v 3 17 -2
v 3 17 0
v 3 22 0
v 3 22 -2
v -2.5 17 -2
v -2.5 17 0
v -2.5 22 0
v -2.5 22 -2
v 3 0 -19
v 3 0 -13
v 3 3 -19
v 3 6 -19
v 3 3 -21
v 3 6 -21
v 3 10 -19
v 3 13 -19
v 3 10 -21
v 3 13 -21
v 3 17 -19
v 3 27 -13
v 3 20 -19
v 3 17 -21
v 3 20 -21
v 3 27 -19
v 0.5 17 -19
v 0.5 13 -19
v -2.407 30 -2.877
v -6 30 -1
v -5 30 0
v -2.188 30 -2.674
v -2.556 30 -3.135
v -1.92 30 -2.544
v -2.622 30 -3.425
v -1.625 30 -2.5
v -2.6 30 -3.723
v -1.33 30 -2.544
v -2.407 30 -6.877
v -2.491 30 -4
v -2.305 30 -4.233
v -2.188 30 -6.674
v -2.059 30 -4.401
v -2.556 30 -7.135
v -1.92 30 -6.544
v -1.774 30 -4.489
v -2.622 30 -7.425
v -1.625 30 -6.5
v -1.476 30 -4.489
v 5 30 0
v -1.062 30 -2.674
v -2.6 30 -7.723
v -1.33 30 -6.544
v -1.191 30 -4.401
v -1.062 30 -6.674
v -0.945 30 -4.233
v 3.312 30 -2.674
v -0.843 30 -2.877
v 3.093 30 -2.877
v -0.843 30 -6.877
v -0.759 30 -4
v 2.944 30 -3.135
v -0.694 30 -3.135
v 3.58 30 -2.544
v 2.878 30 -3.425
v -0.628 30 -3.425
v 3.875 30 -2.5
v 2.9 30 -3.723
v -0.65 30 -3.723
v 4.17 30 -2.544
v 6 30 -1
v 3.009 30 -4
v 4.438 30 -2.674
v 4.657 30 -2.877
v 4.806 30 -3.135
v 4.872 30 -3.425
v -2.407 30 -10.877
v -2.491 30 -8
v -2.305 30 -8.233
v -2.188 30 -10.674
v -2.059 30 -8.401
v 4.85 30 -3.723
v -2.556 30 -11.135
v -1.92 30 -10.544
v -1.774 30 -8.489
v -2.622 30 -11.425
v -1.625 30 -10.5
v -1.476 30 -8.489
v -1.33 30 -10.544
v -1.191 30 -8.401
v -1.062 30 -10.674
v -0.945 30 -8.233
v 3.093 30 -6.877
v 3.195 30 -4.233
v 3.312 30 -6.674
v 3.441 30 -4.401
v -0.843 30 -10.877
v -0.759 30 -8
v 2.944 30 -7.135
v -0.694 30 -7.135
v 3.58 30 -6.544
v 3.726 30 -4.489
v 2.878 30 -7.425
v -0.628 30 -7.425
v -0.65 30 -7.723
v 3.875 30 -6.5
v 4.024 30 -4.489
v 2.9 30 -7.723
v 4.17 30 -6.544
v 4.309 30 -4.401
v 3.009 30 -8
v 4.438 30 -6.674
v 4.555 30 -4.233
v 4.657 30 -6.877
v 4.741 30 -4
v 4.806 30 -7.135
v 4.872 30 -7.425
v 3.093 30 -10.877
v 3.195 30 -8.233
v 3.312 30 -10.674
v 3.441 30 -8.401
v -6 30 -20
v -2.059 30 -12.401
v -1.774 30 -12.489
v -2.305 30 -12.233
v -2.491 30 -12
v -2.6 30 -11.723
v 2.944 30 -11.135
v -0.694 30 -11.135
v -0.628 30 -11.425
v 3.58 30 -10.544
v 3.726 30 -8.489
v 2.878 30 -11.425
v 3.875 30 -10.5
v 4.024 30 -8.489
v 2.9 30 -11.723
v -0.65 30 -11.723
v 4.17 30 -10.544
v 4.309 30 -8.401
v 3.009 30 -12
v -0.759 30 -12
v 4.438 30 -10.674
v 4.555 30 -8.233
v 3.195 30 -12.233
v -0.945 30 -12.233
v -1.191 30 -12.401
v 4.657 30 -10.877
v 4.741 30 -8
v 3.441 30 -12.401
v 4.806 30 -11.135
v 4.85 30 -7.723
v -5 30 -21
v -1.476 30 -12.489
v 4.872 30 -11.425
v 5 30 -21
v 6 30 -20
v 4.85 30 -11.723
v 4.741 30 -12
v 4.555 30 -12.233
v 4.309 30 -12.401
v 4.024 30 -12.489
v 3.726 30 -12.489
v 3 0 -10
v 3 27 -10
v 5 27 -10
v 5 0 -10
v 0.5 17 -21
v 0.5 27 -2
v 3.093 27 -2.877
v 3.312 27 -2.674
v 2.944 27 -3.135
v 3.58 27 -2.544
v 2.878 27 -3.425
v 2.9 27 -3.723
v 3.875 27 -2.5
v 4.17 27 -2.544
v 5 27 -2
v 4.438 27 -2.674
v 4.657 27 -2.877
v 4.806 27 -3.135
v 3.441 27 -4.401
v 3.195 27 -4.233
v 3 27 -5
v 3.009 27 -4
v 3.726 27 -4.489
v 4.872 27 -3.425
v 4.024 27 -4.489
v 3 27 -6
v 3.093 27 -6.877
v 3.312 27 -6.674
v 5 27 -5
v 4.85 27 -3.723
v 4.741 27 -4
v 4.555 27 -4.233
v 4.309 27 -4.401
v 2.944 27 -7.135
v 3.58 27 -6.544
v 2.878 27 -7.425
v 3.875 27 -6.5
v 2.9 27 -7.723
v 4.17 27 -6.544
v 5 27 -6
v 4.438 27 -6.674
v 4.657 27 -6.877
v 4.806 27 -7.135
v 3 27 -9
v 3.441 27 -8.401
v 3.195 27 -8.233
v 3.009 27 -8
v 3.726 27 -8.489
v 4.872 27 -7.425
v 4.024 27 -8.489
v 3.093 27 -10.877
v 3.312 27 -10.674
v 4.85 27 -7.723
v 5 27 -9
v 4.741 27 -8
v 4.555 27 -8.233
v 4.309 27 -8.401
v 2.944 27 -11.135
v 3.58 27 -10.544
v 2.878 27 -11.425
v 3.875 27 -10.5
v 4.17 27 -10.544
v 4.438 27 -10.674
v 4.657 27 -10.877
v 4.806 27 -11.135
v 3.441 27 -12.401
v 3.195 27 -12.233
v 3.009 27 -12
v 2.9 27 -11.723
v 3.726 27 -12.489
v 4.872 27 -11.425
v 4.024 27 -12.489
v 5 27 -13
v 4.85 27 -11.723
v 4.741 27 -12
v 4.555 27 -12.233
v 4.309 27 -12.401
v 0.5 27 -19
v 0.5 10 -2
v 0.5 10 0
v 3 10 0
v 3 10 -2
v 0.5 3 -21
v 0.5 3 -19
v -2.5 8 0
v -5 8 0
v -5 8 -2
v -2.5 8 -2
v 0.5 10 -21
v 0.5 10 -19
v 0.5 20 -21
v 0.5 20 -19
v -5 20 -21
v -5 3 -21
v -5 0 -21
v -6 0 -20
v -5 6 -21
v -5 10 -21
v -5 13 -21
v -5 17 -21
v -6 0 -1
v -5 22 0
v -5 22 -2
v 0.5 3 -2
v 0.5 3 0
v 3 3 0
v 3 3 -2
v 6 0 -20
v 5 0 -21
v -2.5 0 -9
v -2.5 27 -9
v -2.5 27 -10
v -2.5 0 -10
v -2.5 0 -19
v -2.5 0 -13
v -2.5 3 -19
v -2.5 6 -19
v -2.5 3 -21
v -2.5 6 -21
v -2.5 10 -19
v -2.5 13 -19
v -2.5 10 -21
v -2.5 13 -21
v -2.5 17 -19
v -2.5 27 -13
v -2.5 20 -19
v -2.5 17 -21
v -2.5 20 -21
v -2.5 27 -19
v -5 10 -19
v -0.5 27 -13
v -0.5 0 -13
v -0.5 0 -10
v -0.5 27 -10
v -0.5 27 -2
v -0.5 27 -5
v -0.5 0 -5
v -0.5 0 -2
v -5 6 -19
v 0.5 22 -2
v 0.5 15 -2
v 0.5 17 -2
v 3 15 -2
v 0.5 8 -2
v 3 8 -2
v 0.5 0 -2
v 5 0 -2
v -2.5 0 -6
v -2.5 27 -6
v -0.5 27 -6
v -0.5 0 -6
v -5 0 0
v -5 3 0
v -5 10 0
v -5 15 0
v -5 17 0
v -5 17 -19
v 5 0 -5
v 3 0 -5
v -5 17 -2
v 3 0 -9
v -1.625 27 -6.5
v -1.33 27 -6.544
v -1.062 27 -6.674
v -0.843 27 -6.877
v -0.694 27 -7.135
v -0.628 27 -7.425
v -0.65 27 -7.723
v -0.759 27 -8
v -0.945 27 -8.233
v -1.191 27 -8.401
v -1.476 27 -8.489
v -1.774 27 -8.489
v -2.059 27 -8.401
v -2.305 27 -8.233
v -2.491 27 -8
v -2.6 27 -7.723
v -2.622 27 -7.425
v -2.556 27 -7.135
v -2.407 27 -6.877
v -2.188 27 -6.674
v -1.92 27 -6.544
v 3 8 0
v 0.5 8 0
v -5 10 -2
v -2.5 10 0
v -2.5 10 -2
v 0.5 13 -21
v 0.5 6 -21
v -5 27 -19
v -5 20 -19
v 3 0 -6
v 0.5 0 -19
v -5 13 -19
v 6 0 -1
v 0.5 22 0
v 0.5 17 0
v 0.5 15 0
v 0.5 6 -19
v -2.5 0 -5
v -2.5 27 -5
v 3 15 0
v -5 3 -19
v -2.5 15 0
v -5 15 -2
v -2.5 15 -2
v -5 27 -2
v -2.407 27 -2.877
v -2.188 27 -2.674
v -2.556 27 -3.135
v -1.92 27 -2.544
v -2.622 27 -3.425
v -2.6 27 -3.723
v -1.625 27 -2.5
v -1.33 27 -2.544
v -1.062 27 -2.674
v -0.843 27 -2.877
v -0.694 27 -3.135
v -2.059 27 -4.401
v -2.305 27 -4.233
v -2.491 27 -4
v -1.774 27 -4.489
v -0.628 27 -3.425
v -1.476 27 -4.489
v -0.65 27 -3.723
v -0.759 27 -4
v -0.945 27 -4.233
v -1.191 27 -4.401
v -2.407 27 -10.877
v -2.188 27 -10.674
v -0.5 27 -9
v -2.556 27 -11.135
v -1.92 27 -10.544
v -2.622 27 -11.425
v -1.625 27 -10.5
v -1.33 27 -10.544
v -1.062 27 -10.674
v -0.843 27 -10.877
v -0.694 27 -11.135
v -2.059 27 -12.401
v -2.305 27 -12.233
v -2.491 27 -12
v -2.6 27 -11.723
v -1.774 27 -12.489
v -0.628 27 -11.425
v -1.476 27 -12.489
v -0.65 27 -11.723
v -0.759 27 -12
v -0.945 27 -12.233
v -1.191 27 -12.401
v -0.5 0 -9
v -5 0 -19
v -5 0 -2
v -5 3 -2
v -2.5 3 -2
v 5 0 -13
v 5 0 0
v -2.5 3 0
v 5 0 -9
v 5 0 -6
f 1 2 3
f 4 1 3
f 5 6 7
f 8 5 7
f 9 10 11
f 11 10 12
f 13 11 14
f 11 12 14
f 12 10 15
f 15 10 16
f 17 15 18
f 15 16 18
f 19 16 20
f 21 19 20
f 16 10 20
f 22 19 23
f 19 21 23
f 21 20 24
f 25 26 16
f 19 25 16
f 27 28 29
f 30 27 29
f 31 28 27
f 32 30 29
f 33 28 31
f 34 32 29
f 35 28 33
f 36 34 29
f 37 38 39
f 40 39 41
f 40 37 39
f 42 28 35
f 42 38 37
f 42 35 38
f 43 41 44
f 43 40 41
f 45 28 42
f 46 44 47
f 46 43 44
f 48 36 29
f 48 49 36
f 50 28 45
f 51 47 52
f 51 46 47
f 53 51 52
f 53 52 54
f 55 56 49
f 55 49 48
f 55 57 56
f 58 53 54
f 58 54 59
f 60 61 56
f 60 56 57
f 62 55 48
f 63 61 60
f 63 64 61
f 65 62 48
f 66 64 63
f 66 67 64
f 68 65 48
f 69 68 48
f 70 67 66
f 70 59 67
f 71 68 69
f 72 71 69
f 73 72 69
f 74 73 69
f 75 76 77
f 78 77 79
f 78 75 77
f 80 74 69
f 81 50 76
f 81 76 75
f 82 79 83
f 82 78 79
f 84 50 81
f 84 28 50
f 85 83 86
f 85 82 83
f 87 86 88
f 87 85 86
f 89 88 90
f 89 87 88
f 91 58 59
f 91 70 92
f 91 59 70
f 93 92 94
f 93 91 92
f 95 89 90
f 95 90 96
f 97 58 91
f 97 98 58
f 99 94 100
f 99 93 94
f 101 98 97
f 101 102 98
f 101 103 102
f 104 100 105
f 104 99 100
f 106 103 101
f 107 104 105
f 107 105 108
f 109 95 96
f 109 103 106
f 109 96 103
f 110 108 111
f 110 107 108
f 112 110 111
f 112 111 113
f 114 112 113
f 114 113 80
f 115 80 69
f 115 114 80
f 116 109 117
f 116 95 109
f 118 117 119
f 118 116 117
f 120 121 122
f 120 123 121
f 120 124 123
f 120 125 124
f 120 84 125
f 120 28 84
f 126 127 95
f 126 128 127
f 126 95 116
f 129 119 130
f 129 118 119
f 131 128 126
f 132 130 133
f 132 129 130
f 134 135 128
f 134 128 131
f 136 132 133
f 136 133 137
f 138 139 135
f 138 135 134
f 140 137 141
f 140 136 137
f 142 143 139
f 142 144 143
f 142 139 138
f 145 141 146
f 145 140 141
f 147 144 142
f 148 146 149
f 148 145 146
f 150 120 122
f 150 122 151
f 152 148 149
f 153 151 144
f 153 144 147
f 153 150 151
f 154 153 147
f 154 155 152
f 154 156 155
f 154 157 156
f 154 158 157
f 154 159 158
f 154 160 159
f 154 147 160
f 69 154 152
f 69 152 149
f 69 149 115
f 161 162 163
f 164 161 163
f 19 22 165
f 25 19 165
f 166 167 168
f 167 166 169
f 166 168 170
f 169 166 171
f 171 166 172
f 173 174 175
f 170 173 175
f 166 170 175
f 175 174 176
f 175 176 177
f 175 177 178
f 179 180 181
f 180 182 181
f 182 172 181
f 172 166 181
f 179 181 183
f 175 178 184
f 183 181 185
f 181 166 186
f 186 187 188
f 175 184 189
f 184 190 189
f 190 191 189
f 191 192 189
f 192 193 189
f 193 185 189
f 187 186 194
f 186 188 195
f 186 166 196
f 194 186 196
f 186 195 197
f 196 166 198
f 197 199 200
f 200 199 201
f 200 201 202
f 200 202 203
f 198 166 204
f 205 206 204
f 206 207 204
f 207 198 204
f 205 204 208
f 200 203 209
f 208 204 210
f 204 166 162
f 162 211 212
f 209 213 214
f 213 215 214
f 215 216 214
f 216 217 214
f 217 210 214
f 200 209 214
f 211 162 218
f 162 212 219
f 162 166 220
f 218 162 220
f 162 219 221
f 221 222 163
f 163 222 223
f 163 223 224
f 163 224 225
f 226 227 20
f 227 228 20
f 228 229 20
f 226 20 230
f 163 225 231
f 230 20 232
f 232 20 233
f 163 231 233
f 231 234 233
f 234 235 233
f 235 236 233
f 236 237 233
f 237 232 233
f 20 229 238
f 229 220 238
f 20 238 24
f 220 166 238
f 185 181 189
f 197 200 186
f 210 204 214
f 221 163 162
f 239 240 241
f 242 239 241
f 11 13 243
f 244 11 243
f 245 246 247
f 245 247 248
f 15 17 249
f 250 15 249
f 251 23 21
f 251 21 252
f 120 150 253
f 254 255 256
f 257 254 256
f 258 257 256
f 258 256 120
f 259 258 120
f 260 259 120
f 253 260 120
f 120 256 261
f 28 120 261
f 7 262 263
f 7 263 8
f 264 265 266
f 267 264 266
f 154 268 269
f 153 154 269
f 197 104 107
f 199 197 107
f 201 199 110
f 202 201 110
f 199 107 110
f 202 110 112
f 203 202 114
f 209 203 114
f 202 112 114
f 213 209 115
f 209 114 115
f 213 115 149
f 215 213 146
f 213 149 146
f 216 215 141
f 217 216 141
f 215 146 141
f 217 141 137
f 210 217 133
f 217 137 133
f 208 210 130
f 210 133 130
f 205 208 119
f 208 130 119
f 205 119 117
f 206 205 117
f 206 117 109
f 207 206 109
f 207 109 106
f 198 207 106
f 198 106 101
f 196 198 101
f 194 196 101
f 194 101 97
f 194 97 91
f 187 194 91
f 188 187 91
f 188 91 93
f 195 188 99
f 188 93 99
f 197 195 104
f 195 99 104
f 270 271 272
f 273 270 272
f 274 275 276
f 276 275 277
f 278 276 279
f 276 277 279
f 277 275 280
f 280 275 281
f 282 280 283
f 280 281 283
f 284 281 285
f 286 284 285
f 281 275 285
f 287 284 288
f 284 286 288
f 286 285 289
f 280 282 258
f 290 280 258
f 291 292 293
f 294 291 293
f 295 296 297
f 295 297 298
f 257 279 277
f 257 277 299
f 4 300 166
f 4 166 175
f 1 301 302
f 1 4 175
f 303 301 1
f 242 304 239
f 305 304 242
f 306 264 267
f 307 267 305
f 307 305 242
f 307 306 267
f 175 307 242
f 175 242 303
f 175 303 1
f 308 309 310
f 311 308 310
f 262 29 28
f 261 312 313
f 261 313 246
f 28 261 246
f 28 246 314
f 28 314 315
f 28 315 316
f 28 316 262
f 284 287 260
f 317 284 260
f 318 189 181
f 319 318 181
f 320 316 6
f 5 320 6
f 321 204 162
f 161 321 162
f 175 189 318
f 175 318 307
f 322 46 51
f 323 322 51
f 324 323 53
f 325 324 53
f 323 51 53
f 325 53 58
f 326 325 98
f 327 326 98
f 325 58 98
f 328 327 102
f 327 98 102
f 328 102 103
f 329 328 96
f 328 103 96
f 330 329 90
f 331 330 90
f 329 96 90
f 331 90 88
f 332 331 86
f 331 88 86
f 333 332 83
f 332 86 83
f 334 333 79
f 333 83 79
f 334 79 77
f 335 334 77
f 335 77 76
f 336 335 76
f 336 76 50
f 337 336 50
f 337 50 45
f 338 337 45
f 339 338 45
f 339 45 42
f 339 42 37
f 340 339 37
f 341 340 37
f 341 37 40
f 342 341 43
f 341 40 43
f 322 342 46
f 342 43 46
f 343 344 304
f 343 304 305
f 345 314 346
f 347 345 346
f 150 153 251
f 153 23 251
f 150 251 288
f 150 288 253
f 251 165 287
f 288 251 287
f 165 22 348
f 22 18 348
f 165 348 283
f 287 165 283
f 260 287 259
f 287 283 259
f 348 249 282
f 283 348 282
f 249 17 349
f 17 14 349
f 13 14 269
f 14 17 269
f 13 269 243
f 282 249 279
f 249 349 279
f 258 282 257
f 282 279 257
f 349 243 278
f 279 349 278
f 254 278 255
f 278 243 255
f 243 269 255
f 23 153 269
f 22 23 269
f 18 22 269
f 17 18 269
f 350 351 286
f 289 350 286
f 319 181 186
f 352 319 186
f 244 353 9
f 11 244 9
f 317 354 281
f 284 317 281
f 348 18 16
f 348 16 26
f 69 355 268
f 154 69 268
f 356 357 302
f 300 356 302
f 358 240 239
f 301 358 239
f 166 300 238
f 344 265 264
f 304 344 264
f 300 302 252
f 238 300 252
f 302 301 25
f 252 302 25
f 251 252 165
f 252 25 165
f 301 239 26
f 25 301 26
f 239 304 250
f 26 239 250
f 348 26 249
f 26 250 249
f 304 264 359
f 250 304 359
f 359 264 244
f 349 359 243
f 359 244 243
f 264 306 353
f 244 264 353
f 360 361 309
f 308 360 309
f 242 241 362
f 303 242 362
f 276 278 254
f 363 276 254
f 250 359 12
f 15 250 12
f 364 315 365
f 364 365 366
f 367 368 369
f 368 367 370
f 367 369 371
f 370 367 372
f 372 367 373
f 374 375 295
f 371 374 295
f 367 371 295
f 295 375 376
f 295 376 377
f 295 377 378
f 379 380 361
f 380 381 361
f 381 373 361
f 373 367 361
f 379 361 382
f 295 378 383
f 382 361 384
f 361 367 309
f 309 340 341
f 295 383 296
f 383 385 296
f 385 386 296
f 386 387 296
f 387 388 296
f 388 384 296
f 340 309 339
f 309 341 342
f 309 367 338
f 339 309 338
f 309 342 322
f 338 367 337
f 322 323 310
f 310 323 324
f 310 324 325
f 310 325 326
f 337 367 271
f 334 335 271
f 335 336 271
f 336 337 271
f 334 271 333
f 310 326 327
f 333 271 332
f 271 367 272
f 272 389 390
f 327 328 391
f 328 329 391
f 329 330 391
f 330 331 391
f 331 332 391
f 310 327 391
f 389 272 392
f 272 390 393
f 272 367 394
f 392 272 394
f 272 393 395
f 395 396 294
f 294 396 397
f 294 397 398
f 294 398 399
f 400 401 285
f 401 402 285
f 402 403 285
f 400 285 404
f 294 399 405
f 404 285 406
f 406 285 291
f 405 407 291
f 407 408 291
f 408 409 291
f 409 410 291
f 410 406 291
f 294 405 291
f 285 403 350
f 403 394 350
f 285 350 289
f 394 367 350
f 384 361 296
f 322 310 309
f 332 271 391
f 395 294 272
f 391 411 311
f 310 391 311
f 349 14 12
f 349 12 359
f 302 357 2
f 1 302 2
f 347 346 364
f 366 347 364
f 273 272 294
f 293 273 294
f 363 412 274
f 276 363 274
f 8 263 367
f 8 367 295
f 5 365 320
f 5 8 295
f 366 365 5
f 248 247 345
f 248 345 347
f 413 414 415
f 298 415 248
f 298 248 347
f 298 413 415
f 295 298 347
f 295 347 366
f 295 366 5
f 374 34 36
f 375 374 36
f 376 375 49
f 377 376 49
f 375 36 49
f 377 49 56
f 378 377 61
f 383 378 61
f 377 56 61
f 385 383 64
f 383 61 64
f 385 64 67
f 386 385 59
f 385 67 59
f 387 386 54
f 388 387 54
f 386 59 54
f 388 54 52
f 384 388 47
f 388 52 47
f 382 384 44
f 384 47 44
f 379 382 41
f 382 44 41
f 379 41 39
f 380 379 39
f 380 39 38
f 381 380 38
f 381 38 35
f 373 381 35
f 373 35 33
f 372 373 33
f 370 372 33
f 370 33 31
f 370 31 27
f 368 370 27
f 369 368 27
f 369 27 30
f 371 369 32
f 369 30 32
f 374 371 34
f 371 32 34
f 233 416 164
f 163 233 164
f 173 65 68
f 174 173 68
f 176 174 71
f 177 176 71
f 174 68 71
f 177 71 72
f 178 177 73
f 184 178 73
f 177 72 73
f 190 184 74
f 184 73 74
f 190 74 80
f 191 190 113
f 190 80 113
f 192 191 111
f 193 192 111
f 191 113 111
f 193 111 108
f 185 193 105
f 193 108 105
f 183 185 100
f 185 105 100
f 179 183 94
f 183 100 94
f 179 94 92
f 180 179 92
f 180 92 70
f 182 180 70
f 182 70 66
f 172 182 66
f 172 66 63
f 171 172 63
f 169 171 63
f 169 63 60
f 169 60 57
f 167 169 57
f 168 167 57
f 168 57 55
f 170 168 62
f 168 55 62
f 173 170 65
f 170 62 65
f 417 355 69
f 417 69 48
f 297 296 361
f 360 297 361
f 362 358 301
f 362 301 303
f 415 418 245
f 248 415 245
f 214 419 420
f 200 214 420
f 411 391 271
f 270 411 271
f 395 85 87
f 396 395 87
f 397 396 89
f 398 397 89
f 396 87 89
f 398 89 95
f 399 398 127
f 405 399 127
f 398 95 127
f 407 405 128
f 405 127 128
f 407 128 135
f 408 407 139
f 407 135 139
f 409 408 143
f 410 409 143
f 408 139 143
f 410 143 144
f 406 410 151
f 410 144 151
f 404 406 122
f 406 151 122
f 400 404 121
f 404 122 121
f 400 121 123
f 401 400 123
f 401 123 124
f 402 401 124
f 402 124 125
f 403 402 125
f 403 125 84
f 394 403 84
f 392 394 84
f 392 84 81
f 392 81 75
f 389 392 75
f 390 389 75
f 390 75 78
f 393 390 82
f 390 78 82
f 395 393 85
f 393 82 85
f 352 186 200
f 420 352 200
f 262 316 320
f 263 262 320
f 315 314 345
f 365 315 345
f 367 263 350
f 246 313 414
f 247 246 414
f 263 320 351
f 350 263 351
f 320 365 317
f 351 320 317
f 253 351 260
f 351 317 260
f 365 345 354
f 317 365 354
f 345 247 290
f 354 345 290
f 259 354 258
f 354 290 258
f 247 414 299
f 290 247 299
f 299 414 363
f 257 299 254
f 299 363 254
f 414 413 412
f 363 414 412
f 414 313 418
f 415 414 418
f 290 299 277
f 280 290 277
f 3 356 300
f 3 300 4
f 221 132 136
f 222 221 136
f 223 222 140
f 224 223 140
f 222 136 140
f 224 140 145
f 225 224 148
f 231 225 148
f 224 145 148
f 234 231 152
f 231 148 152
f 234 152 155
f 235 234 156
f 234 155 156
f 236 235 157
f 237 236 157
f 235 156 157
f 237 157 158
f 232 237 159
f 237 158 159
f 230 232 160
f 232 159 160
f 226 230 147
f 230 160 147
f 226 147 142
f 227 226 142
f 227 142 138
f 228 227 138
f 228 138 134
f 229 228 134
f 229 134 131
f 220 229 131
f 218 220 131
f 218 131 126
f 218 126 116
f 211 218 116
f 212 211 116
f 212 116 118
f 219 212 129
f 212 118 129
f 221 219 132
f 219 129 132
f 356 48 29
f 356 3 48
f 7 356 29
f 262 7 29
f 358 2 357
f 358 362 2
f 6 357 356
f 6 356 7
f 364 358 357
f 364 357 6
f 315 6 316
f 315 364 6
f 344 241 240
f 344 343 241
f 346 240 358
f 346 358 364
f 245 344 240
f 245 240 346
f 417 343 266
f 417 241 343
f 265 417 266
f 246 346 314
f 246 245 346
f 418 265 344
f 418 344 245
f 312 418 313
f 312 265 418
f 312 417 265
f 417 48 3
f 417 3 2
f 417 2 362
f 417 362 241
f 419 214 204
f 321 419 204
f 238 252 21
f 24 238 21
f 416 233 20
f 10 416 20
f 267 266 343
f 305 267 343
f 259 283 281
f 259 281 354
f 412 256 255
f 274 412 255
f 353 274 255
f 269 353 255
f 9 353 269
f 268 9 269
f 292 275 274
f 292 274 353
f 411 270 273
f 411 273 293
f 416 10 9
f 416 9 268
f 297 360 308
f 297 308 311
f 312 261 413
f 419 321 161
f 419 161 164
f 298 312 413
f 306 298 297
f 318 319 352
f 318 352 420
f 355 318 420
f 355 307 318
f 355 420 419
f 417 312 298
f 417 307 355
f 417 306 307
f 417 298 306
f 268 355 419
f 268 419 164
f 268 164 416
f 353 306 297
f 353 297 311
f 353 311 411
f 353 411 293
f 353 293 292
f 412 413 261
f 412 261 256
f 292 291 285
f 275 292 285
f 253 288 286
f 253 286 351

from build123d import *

# Parameters (mm, degrees)
EXTRUDE_1_DEPTH                  = 30
SKETCH_2_W                       = 4.5
SKETCH_2_H                       = 17
SKETCH_2_R                       = 1
EXTRUDE_2_DEPTH                  = 3
EXTRUDE_3_DEPTH                  = 27
PATTERN_LINEAR_1_COUNT           = 2
PATTERN_LINEAR_1_PITCH           = 5.5
PATTERN_LINEAR_2_COUNT           = 2
PATTERN_LINEAR_2_PITCH           = 5.5
CUT_EXTRUDE_1_REACH              = 39.108
SKETCH_5_W                       = 2.5
SKETCH_5_H                       = 3
PATTERN_LINEAR_3_COUNT           = 3
PATTERN_LINEAR_3_PITCH           = 7
PATTERN_LINEAR_4_COUNT           = 2
PATTERN_LINEAR_4_PITCH           = 5.5
PATTERN_LINEAR_4_COPY_1_REACH    = 39.108
PATTERN_LINEAR_4_COPY_1_SKETCH_W = 2.5
PATTERN_LINEAR_4_COPY_1_SKETCH_H = 3
PATTERN_LINEAR_4_COPY_2_REACH    = 39.108
PATTERN_LINEAR_4_COPY_2_SKETCH_W = 2.5
PATTERN_LINEAR_4_COPY_2_SKETCH_H = 3
CUT_EXTRUDE_2_REACH              = 39.108
SKETCH_6_W                       = 2.5
SKETCH_6_H                       = 5
PATTERN_LINEAR_5_COUNT           = 3
PATTERN_LINEAR_5_PITCH           = 7
PATTERN_LINEAR_7_COUNT           = 2
PATTERN_LINEAR_7_PITCH           = 5.5
PATTERN_LINEAR_7_COPY_1_REACH    = 39.108
PATTERN_LINEAR_7_COPY_1_SKETCH_W = 2.5
PATTERN_LINEAR_7_COPY_1_SKETCH_H = 5
PATTERN_LINEAR_7_COPY_2_REACH    = 39.108
PATTERN_LINEAR_7_COPY_2_SKETCH_W = 2.5
PATTERN_LINEAR_7_COPY_2_SKETCH_H = 5


with BuildPart() as part:
    # Эскиз1 → Бобышка-Вытянуть1 (new body)
    with BuildSketch(Plane(origin=(0, 0, 0), x_dir=(1, 0, 0), z_dir=(0, 1, 0))):
        Polygon((5, 0), (-5, 0), (-6, 1), (-6, 10.5), (-5, 10.5), (-5, 2), (-0.5, 2), (-0.5, 10.5), (0.5, 10.5), (0.5, 2), (5, 2), (5, 10.5), (6, 10.5), (6, 1), align=None)
    extrude_1 = extrude(amount=EXTRUDE_1_DEPTH)

    # Зеркальное отражение1: Бобышка-Вытянуть1 across plane
    add(extrude_1.mirror(Plane(origin=(-0.5, 30, -10.5), x_dir=(1, 0, 0), z_dir=(0, 0, 1))))

    # Эскиз2 → Бобышка-Вытянуть2 (add)
    with BuildSketch(Plane(origin=(0, 30, 0), x_dir=(1, 0, 0), z_dir=(0, 1, 0))):
        with Locations((-2.75, 10.5)):
            Rectangle(SKETCH_2_W, SKETCH_2_H)
        with Locations(Location((-1.625, 11.5, 0), (0, 0, 270))):
            Circle(SKETCH_2_R, mode=Mode.SUBTRACT)
        with Locations(Location((-1.625, 7.5, 0), (0, 0, 270))):
            Circle(SKETCH_2_R, mode=Mode.SUBTRACT)
        with Locations(Location((-1.625, 3.5, 0), (0, 0, 270))):
            Circle(SKETCH_2_R, mode=Mode.SUBTRACT)
    extrude_2 = extrude(amount=-EXTRUDE_2_DEPTH)

    # Эскиз3 → Бобышка-Вытянуть3 (add)
    with BuildSketch(Plane.XZ.offset(-27)):
        Polygon((-2.5, -19), (-0.5, -19), (-0.5, -13), (-1.625, -13), (-2.5, -13), align=None)
        Polygon((-1.625, -10), (-0.5, -10), (-0.5, -9), (-1.625, -9), (-2.5, -9), (-2.5, -10), align=None)
        Polygon((-1.625, -6), (-0.5, -6), (-0.5, -5), (-2.5, -5), (-2.5, -6), align=None)
    extrude_3 = extrude(amount=EXTRUDE_3_DEPTH)

    # Линейный массив1: Бобышка-Вытянуть2 ×2
    with Locations(*[(i * PATTERN_LINEAR_1_PITCH, 0, 0) for i in range(1, PATTERN_LINEAR_1_COUNT)]):
        add(extrude_2)

    # Линейный массив2: Бобышка-Вытянуть3 ×2
    with Locations(*[(i * PATTERN_LINEAR_2_PITCH, 0, 0) for i in range(1, PATTERN_LINEAR_2_COUNT)]):
        add(extrude_3)

    # Эскиз5 → Вырез-Вытянуть1 (cut, up to next)
    with BuildSketch(Plane(origin=(0, 0, -21), x_dir=(-1, 0, 0), z_dir=(0, 0, -1)), mode=Mode.PRIVATE) as cut_extrude_1_sk1:
        with Locations((3.75, 18.5)):
            Rectangle(SKETCH_5_W, SKETCH_5_H)
    cut_extrude_1_tool1 = extrude(cut_extrude_1_sk1.sketch, amount=-CUT_EXTRUDE_1_REACH, mode=Mode.PRIVATE) & part.part
    cut_extrude_1 = cut_extrude_1_tool1.solids().sort_by_distance((-3.75, 18.5, -21))[0]
    add(cut_extrude_1, mode=Mode.SUBTRACT)

    # Линейный массив3: Вырез-Вытянуть1 ×3
    with Locations(*[(0, -i * PATTERN_LINEAR_3_PITCH, 0) for i in range(1, PATTERN_LINEAR_3_COUNT)]):
        add(cut_extrude_1, mode=Mode.SUBTRACT)

    # Линейный массив4: Вырез-Вытянуть1 ×2
    with Locations(*[(i * PATTERN_LINEAR_4_PITCH, 0, 0) for i in range(1, PATTERN_LINEAR_4_COUNT)]):
        add(cut_extrude_1, mode=Mode.SUBTRACT)

    # Линейный массив4 copy 1 sketch → Линейный массив4 copy 1 (cut, up to next)
    with BuildSketch(Plane(origin=(5.5, -7, -21), x_dir=(-1, 0, 0), z_dir=(0, 0, -1)), mode=Mode.PRIVATE) as pattern_linear_4_copy_1_sk1:
        with Locations((3.75, 18.5)):
            Rectangle(PATTERN_LINEAR_4_COPY_1_SKETCH_W, PATTERN_LINEAR_4_COPY_1_SKETCH_H)
    pattern_linear_4_copy_1_tool1 = extrude(pattern_linear_4_copy_1_sk1.sketch, amount=-PATTERN_LINEAR_4_COPY_1_REACH, mode=Mode.PRIVATE) & part.part
    add(pattern_linear_4_copy_1_tool1.solids().sort_by_distance((1.75, 11.5, -21))[0], mode=Mode.SUBTRACT)

    # Линейный массив4 copy 2 sketch → Линейный массив4 copy 2 (cut, up to next)
    with BuildSketch(Plane(origin=(5.5, -14, -21), x_dir=(-1, 0, 0), z_dir=(0, 0, -1)), mode=Mode.PRIVATE) as pattern_linear_4_copy_2_sk1:
        with Locations((3.75, 18.5)):
            Rectangle(PATTERN_LINEAR_4_COPY_2_SKETCH_W, PATTERN_LINEAR_4_COPY_2_SKETCH_H)
    pattern_linear_4_copy_2_tool1 = extrude(pattern_linear_4_copy_2_sk1.sketch, amount=-PATTERN_LINEAR_4_COPY_2_REACH, mode=Mode.PRIVATE) & part.part
    add(pattern_linear_4_copy_2_tool1.solids().sort_by_distance((1.75, 4.5, -21))[0], mode=Mode.SUBTRACT)

    # Эскиз6 → Вырез-Вытянуть2 (cut, up to next)
    with BuildSketch(Plane.XY, mode=Mode.PRIVATE) as cut_extrude_2_sk1:
        with Locations((-3.75, 19.5)):
            Rectangle(SKETCH_6_W, SKETCH_6_H)
    cut_extrude_2_tool1 = extrude(cut_extrude_2_sk1.sketch, amount=-CUT_EXTRUDE_2_REACH, mode=Mode.PRIVATE) & part.part
    cut_extrude_2 = cut_extrude_2_tool1.solids().sort_by_distance((-3.75, 19.5, 0))[0]
    add(cut_extrude_2, mode=Mode.SUBTRACT)

    # Линейный массив5: Вырез-Вытянуть2 ×3
    with Locations(*[(0, -i * PATTERN_LINEAR_5_PITCH, 0) for i in range(1, PATTERN_LINEAR_5_COUNT)]):
        add(cut_extrude_2, mode=Mode.SUBTRACT)

    # Линейный массив7: Вырез-Вытянуть2 ×2
    with Locations(*[(i * PATTERN_LINEAR_7_PITCH, 0, 0) for i in range(1, PATTERN_LINEAR_7_COUNT)]):
        add(cut_extrude_2, mode=Mode.SUBTRACT)

    # Линейный массив7 copy 1 sketch → Линейный массив7 copy 1 (cut, up to next)
    with BuildSketch(Plane(origin=(5.5, -7, 0), x_dir=(1, 0, 0), z_dir=(0, 0, 1)), mode=Mode.PRIVATE) as pattern_linear_7_copy_1_sk1:
        with Locations((-3.75, 19.5)):
            Rectangle(PATTERN_LINEAR_7_COPY_1_SKETCH_W, PATTERN_LINEAR_7_COPY_1_SKETCH_H)
    pattern_linear_7_copy_1_tool1 = extrude(pattern_linear_7_copy_1_sk1.sketch, amount=-PATTERN_LINEAR_7_COPY_1_REACH, mode=Mode.PRIVATE) & part.part
    add(pattern_linear_7_copy_1_tool1.solids().sort_by_distance((1.75, 12.5, 0))[0], mode=Mode.SUBTRACT)

    # Линейный массив7 copy 2 sketch → Линейный массив7 copy 2 (cut, up to next)
    with BuildSketch(Plane(origin=(5.5, -14, 0), x_dir=(1, 0, 0), z_dir=(0, 0, 1)), mode=Mode.PRIVATE) as pattern_linear_7_copy_2_sk1:
        with Locations((-3.75, 19.5)):
            Rectangle(PATTERN_LINEAR_7_COPY_2_SKETCH_W, PATTERN_LINEAR_7_COPY_2_SKETCH_H)
    pattern_linear_7_copy_2_tool1 = extrude(pattern_linear_7_copy_2_sk1.sketch, amount=-PATTERN_LINEAR_7_COPY_2_REACH, mode=Mode.PRIVATE) & part.part
    add(pattern_linear_7_copy_2_tool1.solids().sort_by_distance((1.75, 5.5, 0))[0], mode=Mode.SUBTRACT)


solid = part.part
